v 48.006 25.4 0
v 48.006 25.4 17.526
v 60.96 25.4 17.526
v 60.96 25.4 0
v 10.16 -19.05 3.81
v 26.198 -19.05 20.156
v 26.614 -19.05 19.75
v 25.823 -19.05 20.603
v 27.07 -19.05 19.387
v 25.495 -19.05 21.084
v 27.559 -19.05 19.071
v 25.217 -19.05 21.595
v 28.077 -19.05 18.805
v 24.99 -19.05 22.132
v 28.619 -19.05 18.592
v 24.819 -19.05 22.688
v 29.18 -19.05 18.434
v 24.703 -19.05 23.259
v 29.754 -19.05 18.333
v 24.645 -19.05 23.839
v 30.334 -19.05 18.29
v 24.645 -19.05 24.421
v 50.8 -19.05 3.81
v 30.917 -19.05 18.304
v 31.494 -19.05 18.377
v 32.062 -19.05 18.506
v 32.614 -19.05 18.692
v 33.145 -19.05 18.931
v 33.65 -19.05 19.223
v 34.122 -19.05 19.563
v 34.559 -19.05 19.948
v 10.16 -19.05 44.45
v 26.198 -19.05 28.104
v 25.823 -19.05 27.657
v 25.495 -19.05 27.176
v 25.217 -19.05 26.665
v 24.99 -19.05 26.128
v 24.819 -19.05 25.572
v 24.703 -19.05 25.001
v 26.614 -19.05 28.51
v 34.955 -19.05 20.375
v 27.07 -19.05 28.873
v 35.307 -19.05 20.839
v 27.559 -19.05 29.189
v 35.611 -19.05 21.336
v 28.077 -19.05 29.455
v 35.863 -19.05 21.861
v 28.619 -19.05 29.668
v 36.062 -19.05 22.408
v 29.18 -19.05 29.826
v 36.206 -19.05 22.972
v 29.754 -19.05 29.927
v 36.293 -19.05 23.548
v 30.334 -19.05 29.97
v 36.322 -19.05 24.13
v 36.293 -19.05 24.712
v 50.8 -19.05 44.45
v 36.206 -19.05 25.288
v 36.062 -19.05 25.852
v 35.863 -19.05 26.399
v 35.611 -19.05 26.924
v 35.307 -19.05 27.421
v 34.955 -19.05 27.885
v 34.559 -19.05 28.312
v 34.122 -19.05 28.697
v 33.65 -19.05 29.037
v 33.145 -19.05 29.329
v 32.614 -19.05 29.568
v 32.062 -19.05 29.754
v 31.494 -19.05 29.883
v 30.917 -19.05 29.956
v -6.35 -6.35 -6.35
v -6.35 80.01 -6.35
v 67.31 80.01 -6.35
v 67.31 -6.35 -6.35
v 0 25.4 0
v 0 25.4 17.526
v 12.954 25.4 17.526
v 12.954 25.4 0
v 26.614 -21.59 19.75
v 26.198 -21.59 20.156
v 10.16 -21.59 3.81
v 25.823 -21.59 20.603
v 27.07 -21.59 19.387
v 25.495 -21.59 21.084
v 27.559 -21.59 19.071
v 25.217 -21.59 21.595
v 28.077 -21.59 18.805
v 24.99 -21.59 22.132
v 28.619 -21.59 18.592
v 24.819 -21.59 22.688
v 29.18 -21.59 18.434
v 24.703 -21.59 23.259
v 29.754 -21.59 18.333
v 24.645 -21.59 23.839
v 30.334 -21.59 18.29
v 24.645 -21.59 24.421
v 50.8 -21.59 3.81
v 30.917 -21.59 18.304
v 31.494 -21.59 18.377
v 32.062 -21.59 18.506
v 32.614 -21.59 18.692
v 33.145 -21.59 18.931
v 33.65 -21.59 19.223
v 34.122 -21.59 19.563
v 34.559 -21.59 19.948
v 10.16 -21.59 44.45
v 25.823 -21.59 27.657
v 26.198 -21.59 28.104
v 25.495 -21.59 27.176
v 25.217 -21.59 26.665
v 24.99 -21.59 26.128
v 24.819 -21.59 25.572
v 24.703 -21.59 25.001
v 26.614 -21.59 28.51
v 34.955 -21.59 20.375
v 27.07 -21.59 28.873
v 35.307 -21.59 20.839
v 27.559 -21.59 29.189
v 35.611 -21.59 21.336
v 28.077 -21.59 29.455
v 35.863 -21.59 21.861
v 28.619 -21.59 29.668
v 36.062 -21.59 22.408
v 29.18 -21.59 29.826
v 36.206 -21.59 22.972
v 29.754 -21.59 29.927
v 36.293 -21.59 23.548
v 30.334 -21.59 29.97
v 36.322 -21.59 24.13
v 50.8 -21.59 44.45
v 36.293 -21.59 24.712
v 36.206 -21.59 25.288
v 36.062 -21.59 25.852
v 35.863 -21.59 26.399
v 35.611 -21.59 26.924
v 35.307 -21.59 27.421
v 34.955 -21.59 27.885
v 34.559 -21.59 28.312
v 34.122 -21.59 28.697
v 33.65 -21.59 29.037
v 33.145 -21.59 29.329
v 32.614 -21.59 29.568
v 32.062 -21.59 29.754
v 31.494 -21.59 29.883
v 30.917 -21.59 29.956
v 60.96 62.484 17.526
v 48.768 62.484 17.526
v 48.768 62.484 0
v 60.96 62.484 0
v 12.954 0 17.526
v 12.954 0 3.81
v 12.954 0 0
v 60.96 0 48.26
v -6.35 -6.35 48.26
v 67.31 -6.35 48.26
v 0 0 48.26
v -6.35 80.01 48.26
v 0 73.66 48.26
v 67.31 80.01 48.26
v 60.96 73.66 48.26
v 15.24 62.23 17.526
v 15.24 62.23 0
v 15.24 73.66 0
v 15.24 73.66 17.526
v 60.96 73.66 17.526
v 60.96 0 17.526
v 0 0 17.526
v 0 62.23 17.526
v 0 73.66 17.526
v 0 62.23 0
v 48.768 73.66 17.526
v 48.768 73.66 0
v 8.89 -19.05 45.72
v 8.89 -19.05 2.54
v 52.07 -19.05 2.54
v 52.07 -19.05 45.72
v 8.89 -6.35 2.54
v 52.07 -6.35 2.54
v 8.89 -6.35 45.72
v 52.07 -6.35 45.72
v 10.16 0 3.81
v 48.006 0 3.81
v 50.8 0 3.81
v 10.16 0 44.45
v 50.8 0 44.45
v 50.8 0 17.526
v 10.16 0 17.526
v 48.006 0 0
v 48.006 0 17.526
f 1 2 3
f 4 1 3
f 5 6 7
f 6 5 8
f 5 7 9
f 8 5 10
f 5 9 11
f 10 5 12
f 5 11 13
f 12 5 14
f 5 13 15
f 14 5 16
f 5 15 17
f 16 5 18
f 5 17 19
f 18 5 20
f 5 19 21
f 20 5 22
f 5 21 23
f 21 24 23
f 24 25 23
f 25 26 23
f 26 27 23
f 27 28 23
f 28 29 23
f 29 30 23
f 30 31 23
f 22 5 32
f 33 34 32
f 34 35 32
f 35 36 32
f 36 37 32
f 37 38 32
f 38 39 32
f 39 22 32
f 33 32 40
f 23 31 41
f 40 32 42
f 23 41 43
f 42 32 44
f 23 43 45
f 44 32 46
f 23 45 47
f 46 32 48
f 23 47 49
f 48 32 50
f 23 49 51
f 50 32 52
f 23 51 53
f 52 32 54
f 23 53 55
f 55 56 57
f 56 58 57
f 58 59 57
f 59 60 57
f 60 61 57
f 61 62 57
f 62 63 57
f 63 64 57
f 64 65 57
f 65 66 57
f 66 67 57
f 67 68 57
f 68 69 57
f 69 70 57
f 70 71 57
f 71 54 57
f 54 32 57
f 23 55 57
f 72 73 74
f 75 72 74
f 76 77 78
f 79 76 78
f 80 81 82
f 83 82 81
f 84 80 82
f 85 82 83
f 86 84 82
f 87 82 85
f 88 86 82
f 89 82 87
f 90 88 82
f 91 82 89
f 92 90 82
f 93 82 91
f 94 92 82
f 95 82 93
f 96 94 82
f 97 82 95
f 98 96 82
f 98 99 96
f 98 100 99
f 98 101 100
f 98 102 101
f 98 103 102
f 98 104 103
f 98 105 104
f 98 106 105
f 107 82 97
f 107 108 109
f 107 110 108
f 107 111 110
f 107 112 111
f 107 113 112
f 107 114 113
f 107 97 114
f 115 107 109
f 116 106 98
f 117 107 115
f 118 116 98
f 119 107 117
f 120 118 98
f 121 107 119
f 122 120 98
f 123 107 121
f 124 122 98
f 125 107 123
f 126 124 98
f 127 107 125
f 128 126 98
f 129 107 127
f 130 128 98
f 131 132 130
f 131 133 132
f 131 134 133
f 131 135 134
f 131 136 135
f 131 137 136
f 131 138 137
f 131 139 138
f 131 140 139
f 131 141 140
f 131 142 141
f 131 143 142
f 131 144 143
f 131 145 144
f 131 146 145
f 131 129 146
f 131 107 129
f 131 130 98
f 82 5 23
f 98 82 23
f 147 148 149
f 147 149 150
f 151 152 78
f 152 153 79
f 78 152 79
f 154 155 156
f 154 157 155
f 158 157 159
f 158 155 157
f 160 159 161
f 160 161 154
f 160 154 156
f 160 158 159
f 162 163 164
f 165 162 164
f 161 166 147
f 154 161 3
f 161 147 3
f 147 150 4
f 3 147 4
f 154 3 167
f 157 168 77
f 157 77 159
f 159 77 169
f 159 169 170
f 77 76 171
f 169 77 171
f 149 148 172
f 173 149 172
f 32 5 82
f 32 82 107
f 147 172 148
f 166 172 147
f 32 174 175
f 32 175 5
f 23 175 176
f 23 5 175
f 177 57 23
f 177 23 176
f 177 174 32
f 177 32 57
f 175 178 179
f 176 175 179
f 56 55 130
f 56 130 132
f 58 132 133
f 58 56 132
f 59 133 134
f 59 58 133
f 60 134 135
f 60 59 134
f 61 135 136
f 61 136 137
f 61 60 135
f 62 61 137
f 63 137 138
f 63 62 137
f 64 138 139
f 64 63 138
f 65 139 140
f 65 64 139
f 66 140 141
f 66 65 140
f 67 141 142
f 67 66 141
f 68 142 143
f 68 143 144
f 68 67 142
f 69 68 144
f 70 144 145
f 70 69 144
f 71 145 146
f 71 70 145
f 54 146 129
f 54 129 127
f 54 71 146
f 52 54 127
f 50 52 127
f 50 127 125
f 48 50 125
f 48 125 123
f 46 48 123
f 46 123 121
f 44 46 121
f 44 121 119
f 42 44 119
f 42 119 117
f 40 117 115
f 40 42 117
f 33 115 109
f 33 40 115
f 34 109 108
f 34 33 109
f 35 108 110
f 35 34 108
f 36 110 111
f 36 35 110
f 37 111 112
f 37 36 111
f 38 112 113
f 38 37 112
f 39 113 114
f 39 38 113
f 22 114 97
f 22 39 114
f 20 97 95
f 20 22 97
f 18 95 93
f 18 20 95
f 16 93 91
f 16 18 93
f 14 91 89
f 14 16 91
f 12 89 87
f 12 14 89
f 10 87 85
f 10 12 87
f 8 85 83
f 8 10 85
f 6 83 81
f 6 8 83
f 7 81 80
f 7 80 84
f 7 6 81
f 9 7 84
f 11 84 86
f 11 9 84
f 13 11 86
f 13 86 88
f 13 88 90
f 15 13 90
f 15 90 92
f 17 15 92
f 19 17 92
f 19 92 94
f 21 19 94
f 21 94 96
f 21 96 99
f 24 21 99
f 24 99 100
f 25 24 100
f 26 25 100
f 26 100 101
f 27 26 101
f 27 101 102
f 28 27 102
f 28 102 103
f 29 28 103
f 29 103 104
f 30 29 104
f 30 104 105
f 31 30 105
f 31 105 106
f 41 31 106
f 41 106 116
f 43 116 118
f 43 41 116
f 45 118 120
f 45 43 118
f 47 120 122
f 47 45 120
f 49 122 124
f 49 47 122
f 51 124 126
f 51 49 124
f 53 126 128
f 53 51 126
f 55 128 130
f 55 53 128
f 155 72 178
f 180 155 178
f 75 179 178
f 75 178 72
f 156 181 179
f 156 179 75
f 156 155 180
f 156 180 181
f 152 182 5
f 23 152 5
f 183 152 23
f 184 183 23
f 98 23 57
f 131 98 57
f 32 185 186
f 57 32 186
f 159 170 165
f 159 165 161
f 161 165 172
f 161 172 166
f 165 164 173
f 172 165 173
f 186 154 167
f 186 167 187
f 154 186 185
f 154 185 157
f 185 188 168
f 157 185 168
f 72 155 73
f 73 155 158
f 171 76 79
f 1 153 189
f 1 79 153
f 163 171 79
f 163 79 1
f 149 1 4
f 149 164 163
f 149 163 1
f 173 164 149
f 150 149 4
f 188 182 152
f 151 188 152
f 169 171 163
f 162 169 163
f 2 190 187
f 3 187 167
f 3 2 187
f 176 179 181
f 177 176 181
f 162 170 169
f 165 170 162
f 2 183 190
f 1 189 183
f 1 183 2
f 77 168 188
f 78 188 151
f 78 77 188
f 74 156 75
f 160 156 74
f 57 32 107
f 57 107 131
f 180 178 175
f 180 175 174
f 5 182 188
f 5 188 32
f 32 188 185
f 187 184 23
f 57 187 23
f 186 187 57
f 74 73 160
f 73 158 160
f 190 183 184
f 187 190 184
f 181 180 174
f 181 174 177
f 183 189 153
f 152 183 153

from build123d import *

# Parameters (mm, degrees)
F0_W     = 15.24
F0_H     = 11.43
F1_DEPTH = 17.526
F0_W_2   = 12.192
F0_H_2   = 11.176
F0_W_3   = 12.954
F0_H_3   = 25.4
F0_W_4   = 73.66
F0_H_4   = 86.36
F2_DEPTH = 48.26
F3_DEPTH = 6.35
F4_W     = 40.64
F4_H     = 40.64
F5_DEPTH = 6.3754
F6_W     = 43.18
F6_H     = 43.18
F6_W_2   = 40.64
F6_H_2   = 40.64
F7_DEPTH = 12.7
F8_W     = 40.64
F8_H     = 40.64
F8_R     = 5.842
F9_DEPTH = 2.54


with BuildPart() as f1:
    # F0 (on Top) → F1 (new body)
    with BuildSketch(Plane.XY):
        with Locations((7.62, 67.945)):
            Rectangle(F0_W, F0_H)
    extrude(amount=F1_DEPTH)



with BuildPart() as f1b:
    # F0 (on Top) → F1, piece 2 (new body)
    with BuildSketch(Plane.XY):
        with Locations((54.864, 68.072)):
            Rectangle(F0_W_2, F0_H_2)
    extrude(amount=F1_DEPTH)


with BuildPart() as f1c:
    # F0 (on Top) → F1, piece 3 (new body)
    with BuildSketch(Plane.XY):
        with Locations((54.483, 12.7)):
            Rectangle(F0_W_3, F0_H_3)
    extrude(amount=F1_DEPTH)


with BuildPart() as f1d:
    # F0 (on Top) → F1, piece 4 (new body)
    with BuildSketch(Plane.XY):
        with Locations((6.477, 12.7)):
            Rectangle(F0_W_3, F0_H_3)
    extrude(amount=F1_DEPTH)


with BuildPart() as f2:
    # F0 (on Top) → F2 (new body)
    with BuildSketch(Plane.XY):
        with Locations((30.48, 36.83)):
            Rectangle(F0_W_4, F0_H_4)
        Polygon((12.954, 0), (0, 0), (0, 25.4), (0, 62.23), (0, 73.66), (15.24, 73.66), (48.768, 73.66), (60.96, 73.66), (60.96, 62.484), (60.96, 25.4), (60.96, 0), (48.006, 0), align=None, mode=Mode.SUBTRACT)
    extrude(amount=F2_DEPTH)

    # F4 (on face) → F5 (cut)
    with BuildSketch(Plane.XZ.offset(6.35)):
        with Locations((30.48, 24.13)):
            Rectangle(F4_W, F4_H)
    extrude(amount=-F5_DEPTH, mode=Mode.SUBTRACT)


with BuildPart() as f3:
    # F0 (on Top) → F3 (new body)
    with BuildSketch(Plane.XY):
        with Locations((30.48, 36.83)):
            Rectangle(F0_W_4, F0_H_4)
        Polygon((12.954, 0), (0, 0), (0, 25.4), (0, 62.23), (0, 73.66), (15.24, 73.66), (48.768, 73.66), (60.96, 73.66), (60.96, 62.484), (60.96, 25.4), (60.96, 0), (48.006, 0), align=None, mode=Mode.SUBTRACT)
        Polygon((12.954, 25.4), (12.954, 0), (48.006, 0), (48.006, 25.4), (60.96, 25.4), (60.96, 62.484), (48.768, 62.484), (48.768, 73.66), (15.24, 73.66), (15.24, 62.23), (0, 62.23), (0, 25.4), align=None)
        with Locations((6.477, 12.7)):
            Rectangle(F0_W_3, F0_H_3)
        with Locations((54.483, 12.7)):
            Rectangle(F0_W_3, F0_H_3)
        with Locations((7.62, 67.945)):
            Rectangle(F0_W, F0_H)
        with Locations((54.864, 68.072)):
            Rectangle(F0_W_2, F0_H_2)
    extrude(amount=-F3_DEPTH)


with BuildPart() as f1_1:
    add(f1.part)

    add(f1b.part)  # F7 merges F1b

    add(f1c.part)  # F7 merges F1c

    add(f1d.part)  # F7 merges F1d

    add(f2.part)  # F7 merges F2

    add(f3.part)  # F7 merges F3
    # F6 (on face) → F7 (join)
    with BuildSketch(Plane.XZ.offset(6.35)):
        with Locations((30.48, 24.13)):
            Rectangle(F6_W, F6_H)
        with Locations((30.48, 24.13)):
            Rectangle(F6_W_2, F6_H_2, mode=Mode.SUBTRACT)
    extrude(amount=F7_DEPTH)


with BuildPart() as f9:
    # F8 (on face) → F9 (new body)
    with BuildSketch(Plane.XZ.offset(19.05)):
        with Locations((30.48, 24.13)):
            Rectangle(F8_W, F8_H)
        with Locations((30.48, 24.13)):
            Circle(F8_R, mode=Mode.SUBTRACT)
    extrude(amount=F9_DEPTH)


solid = Compound([f1_1.part, f9.part])
